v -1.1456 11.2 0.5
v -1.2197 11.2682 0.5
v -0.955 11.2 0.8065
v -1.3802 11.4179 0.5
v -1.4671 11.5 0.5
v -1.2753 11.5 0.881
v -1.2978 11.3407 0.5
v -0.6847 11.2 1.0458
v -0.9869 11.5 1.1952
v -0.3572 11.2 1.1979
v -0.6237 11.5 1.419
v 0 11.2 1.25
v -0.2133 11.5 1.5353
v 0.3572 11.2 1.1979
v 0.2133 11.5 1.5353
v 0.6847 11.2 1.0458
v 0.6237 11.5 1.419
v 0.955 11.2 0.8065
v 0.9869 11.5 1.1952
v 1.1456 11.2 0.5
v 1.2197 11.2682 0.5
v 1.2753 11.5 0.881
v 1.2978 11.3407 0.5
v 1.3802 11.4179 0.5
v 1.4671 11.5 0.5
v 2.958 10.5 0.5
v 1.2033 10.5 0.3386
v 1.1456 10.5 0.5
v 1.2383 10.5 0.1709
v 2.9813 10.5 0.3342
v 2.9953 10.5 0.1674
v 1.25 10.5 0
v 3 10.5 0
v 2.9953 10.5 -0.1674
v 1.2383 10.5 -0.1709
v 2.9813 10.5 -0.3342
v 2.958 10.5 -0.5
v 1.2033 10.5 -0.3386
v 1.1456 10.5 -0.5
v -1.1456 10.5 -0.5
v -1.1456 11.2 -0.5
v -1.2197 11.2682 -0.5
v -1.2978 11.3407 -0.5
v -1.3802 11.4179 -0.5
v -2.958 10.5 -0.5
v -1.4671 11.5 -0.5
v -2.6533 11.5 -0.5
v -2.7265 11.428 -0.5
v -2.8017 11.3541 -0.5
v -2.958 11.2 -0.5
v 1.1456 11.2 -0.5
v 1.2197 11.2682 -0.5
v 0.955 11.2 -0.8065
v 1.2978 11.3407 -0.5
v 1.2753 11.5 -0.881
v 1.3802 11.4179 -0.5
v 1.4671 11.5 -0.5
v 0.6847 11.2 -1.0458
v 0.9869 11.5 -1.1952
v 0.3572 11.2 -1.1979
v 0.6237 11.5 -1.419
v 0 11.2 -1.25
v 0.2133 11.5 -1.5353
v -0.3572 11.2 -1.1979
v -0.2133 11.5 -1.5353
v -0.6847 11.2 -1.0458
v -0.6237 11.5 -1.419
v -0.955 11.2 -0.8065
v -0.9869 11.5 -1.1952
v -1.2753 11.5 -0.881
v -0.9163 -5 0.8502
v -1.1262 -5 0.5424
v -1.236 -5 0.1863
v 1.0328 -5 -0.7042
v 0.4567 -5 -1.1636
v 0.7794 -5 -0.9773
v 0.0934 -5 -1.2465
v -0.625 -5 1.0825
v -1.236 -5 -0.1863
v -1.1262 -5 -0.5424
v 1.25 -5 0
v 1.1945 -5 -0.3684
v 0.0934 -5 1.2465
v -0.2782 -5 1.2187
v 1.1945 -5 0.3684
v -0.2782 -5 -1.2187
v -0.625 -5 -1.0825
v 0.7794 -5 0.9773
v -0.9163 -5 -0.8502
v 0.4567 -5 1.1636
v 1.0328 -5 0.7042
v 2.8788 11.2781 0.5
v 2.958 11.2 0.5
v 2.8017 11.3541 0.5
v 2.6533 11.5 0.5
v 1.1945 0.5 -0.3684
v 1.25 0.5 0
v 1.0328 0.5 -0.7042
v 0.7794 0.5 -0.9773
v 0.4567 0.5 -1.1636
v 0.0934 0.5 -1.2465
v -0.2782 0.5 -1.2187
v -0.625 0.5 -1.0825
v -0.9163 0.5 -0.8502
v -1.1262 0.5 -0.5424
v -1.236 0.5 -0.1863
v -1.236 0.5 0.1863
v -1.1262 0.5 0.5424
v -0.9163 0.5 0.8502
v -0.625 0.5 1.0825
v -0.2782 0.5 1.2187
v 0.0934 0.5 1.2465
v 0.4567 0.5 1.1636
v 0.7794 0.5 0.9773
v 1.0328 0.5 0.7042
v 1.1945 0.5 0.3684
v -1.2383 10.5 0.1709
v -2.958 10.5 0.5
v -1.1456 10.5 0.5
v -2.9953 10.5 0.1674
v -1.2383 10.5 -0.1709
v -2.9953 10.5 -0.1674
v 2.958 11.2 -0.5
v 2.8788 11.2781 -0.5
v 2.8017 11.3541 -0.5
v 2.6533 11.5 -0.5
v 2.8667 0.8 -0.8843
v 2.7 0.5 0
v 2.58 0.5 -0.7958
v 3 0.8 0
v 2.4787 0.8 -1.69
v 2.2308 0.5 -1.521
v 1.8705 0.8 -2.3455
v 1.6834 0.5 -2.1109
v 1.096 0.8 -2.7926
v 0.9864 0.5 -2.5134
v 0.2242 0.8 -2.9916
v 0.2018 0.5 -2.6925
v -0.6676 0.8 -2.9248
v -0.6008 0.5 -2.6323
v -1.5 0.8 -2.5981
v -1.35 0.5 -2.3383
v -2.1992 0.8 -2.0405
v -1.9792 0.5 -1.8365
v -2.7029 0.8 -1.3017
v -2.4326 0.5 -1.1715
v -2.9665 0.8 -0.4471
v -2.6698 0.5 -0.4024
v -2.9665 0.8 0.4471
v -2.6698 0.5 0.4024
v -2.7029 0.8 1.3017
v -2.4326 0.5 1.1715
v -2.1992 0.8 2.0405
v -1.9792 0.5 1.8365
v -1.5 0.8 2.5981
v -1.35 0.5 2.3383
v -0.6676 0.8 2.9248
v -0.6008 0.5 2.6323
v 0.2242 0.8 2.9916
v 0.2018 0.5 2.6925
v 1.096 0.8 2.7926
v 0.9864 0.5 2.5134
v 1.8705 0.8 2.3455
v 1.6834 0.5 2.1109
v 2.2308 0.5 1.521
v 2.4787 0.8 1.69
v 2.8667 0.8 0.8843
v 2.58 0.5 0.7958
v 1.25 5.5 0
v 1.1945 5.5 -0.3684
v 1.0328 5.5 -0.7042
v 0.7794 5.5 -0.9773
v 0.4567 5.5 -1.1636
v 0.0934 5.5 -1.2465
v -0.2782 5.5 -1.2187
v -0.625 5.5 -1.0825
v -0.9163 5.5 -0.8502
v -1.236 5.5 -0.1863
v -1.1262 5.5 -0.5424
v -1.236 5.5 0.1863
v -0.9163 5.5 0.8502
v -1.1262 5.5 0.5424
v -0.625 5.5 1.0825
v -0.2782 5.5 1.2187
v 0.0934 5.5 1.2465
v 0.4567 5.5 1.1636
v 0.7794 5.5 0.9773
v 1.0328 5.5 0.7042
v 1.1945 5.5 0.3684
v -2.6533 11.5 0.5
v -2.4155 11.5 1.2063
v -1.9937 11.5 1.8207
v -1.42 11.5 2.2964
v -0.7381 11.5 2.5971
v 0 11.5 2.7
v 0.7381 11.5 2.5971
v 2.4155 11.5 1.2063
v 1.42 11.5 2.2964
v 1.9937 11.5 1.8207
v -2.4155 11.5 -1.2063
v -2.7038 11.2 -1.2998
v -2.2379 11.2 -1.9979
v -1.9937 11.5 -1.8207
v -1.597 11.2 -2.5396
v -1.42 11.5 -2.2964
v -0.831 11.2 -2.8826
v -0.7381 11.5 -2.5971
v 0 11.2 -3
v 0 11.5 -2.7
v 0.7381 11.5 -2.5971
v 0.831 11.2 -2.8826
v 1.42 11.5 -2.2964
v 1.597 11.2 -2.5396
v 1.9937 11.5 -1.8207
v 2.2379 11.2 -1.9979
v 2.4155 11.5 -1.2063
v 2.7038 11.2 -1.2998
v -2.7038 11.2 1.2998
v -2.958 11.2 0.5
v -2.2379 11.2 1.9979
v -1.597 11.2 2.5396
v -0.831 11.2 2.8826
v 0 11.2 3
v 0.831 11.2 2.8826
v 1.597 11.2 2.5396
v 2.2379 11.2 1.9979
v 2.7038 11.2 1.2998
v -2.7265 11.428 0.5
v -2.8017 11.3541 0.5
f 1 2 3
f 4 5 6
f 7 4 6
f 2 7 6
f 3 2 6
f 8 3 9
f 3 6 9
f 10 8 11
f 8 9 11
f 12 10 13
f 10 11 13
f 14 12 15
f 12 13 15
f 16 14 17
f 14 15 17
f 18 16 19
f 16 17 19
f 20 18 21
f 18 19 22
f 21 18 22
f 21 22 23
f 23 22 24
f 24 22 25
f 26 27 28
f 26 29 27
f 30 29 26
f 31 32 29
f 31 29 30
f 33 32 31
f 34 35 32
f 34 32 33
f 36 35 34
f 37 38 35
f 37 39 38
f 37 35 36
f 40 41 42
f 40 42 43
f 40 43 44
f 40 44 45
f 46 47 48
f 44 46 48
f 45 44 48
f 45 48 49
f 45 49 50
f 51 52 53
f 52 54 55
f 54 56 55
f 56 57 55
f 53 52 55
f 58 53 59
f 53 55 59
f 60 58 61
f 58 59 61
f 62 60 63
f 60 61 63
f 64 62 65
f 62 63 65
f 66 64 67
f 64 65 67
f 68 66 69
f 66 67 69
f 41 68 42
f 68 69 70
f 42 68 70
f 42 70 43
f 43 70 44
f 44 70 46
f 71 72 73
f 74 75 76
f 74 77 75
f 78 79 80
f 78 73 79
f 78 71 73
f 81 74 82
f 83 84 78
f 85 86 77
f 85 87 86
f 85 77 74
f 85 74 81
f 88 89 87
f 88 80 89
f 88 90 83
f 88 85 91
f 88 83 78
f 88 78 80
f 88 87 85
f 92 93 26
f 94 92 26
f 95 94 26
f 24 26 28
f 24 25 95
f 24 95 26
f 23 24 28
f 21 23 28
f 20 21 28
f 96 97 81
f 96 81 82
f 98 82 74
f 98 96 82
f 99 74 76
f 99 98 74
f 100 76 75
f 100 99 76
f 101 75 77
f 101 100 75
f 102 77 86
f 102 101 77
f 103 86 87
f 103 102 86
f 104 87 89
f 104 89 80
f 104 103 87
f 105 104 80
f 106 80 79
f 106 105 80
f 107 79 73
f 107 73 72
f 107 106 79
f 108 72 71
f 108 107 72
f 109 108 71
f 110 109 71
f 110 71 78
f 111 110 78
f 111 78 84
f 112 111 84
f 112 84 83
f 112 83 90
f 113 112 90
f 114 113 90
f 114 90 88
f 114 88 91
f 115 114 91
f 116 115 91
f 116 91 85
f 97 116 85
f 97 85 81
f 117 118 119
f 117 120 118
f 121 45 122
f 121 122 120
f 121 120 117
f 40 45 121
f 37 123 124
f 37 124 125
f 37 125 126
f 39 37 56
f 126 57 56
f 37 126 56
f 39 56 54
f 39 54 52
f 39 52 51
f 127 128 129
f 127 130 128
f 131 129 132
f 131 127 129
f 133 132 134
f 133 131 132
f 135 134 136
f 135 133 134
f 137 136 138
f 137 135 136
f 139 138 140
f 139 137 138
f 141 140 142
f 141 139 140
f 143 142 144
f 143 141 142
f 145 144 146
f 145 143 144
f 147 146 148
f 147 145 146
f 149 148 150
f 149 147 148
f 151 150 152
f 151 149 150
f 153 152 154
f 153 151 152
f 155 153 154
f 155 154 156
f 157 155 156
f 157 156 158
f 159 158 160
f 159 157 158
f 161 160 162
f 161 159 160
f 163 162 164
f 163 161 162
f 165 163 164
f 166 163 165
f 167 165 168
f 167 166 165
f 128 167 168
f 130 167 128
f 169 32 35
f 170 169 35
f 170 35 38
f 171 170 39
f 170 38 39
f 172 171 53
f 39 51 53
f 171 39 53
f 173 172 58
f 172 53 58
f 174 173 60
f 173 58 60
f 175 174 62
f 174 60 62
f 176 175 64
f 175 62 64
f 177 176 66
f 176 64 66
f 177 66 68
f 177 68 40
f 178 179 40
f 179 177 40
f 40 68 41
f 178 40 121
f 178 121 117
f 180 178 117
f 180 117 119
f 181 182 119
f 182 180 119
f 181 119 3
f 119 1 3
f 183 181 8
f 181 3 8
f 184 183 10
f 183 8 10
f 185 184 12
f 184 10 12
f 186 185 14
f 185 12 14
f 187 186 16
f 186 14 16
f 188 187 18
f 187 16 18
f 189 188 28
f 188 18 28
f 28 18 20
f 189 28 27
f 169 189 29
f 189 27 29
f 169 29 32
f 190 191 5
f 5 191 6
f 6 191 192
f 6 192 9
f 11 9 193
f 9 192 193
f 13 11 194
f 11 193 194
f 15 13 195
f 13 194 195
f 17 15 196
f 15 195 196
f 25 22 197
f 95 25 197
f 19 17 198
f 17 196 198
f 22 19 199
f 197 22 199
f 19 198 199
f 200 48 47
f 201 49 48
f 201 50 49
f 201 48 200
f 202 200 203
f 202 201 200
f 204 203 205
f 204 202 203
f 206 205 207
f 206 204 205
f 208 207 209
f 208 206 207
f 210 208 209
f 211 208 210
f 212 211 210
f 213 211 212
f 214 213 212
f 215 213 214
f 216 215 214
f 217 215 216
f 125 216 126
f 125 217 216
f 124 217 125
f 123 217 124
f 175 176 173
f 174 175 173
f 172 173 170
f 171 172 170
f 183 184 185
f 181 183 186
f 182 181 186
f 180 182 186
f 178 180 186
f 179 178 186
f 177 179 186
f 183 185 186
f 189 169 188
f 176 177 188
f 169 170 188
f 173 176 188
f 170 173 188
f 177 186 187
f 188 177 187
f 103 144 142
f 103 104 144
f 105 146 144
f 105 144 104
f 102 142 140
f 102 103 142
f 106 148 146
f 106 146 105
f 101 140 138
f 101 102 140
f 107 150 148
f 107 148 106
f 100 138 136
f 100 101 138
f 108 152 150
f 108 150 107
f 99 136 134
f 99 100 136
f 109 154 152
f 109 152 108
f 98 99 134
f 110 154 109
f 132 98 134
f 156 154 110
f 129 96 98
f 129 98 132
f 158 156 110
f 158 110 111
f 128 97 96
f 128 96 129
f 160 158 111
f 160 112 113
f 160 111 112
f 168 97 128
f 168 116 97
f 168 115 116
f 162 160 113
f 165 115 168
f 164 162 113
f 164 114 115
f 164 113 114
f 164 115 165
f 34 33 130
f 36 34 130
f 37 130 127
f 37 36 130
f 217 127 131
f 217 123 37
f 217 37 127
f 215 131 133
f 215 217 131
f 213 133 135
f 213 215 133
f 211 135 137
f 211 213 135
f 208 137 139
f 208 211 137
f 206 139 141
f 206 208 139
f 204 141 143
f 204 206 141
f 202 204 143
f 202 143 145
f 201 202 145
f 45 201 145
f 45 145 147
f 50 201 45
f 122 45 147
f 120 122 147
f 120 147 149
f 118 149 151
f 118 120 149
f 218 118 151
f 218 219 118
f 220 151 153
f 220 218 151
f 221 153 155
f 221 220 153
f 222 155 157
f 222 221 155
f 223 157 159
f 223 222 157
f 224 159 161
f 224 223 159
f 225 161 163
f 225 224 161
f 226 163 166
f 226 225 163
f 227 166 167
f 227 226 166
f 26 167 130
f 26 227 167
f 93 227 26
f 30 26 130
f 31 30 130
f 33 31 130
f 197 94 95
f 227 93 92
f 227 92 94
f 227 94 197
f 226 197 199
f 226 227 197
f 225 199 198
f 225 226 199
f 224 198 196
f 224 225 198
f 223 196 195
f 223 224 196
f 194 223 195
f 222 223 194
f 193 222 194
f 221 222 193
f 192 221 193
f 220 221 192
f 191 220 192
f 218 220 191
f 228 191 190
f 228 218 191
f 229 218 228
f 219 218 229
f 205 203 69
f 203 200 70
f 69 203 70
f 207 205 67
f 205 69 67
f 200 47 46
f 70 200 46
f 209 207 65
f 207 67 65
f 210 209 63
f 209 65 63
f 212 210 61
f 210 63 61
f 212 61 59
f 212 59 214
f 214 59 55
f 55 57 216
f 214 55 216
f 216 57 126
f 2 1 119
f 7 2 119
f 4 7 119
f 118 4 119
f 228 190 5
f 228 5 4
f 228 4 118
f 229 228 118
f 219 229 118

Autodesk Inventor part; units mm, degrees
ref_plane "YZ Plane" through (0, 0, 0) normal (1, 0, 0) x (0, 1, 0)
ref_plane "XZ Plane" through (0, 0, 0) normal (0, 1, 0) x (-1, 0, 0)
ref_plane "XY Plane" through (0, 0, 0) normal (0, 0, 1) x (1, 0, 0)
sketch "スケッチ1" plane through (0, 0, 0) normal (0, 0, 1) x (1, 0, 0)
  line L0 (0, -5.5) -> (0.95, -5.5)
  line L1 (0.95, -5.5) -> (1.25, -5.2)
  line L2 (1.25, -5.2) -> (1.25, 0)
  line L3 (1.25, 0) -> (1.25, 0)
  line L4 (1.25, 0) -> (1.25, 0.5)
  line L5 (1.25, 0.5) -> (2.7, 0.5)
  line L6 (3, 11.2) -> (2.7, 11.5)
  line L7 (2.7, 11.5) -> (1.55, 11.5)
  line L8 (1.55, 11.5) -> (1.25, 11.2)
  line L9 (0, 7.4044) -> (0, -7.4044) construction
  line L10 (0, -5.5) -> (0, 5.5)
  line L11 (0, 5.5) -> (1.25, 5.5)
  line L12 (1.25, 5.5) -> (1.25, 11.2)
  line L13 (2.7, 0.5) -> (3, 0.8)
  line L14 (3, 0.8) -> (3, 11.2)
  point P0 (0, 0)
  point P1 (0, 0)
  dimension "d0" = 2.5
  dimension "d1" = 6
  dimension "d2" = 0.3
  dimension "d3" = 0.3
  dimension "d4" = 2.5
  dimension "d5" = 0.5
  dimension "d6" = 11
  dimension "d8" = 0.3
  dimension "d9" = 2.5
  dimension "d10" = 6
  dimension "d11" = 0.3
  dimension "d12" = 0.3
  dimension "d13" = 0.3
  dimension "d14" = 0.3
  dimension "d15" = 6
revolve "回転1" add sketch "スケッチ1" angle 360 about axis through (0, 7.4044, 0) along (0, -1, 0)
sketch "スケッチ2" plane through (0, -5.5, 0) normal (0, -1, 0) x (1, 0, 0)
  circle A0 centre (0, 0) radius 0.95 projected
  circle A1 centre (0, 0) radius 9.0242
extrude "押し出し1" cut sketch "スケッチ2" against normal blind 0.5 contours A0 | A1
sketch "スケッチ3" plane through (0, 11.5, 0) normal (0, 1, 0) x (1, 0, 0)
  circle A0 centre (0, 0) radius 3 projected
  line L0 (3, 0) -> (-3, 0)
  line L1 (-3, -0.5) -> (-3, 0.5)
  line L2 (3, -0.5) -> (-3, -0.5)
  line L3 (3, 0.5) -> (-3, 0.5)
  line L4 (3, -0.5) -> (3, 0.5)
  point P0 (0, 0)
  point P1 (-2.958, -0.5)
  point P2 (2.958, -0.5)
  point P3 (2.958, 0.5)
  point P4 (-2.958, 0.5)
  dimension "d22" = 0.5
  dimension "d23" = 0.5
extrude "押し出し2" cut sketch "スケッチ3" against normal blind 1 contours L0 A0 L3 | A0 L2 L0
equation "\"d3\" = d2"
equation "\"d11\" = d8"
equation "\"d12\" = d8"
equation "\"d13\" = d12"
equation "\"d14\" = d13"
properties part number "BRU-312S" material "ステンレス鋼 AISI 304"
